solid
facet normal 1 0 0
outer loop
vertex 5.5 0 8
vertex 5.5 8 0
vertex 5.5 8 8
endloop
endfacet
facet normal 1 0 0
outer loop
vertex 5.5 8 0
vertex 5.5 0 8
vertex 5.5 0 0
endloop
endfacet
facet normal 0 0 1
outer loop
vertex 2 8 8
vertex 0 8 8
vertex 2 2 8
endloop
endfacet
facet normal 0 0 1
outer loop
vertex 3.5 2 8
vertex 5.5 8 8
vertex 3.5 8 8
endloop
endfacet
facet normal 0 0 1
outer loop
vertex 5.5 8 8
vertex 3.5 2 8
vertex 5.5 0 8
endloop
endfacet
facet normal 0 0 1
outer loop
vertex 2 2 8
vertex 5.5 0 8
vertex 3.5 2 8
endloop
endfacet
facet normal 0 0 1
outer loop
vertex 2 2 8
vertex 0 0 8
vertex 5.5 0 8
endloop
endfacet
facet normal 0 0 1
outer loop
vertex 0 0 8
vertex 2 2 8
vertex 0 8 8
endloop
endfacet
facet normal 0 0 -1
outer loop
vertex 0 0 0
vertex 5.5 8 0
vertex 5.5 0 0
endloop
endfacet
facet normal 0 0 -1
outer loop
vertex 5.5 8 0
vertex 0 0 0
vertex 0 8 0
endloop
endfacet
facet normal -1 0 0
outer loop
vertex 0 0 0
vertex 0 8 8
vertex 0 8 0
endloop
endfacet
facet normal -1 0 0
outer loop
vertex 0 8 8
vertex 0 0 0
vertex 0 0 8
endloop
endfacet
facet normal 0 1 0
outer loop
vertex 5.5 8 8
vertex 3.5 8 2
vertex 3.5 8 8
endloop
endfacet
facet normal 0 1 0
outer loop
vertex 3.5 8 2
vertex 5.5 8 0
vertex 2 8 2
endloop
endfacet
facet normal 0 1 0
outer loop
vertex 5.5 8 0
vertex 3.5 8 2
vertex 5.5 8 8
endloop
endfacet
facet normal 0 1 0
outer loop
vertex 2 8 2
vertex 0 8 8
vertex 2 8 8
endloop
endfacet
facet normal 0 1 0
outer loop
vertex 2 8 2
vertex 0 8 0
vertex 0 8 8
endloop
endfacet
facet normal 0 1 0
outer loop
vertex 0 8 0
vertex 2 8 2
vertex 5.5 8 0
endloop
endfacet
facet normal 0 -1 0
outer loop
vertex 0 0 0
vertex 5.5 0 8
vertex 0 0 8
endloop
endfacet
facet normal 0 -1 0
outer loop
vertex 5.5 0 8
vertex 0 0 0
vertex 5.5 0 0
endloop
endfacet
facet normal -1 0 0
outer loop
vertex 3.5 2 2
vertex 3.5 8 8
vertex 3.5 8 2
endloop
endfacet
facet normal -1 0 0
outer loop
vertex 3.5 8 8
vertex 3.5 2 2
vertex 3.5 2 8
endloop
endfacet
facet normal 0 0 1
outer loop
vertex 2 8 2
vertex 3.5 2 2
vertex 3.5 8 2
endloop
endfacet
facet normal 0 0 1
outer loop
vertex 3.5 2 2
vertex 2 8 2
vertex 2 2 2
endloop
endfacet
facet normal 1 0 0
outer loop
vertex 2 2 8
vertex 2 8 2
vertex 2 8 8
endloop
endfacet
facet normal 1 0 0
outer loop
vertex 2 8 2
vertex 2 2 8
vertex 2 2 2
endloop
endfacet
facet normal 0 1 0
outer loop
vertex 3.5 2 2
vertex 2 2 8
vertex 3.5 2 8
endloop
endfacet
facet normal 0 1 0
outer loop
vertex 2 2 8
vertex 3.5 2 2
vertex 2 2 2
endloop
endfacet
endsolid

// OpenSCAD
difference(){
translate ([0,0,0]) cube ([5.5,8,8]);
translate ([2,2,2]) cube ([1.5,15,15]);
}
